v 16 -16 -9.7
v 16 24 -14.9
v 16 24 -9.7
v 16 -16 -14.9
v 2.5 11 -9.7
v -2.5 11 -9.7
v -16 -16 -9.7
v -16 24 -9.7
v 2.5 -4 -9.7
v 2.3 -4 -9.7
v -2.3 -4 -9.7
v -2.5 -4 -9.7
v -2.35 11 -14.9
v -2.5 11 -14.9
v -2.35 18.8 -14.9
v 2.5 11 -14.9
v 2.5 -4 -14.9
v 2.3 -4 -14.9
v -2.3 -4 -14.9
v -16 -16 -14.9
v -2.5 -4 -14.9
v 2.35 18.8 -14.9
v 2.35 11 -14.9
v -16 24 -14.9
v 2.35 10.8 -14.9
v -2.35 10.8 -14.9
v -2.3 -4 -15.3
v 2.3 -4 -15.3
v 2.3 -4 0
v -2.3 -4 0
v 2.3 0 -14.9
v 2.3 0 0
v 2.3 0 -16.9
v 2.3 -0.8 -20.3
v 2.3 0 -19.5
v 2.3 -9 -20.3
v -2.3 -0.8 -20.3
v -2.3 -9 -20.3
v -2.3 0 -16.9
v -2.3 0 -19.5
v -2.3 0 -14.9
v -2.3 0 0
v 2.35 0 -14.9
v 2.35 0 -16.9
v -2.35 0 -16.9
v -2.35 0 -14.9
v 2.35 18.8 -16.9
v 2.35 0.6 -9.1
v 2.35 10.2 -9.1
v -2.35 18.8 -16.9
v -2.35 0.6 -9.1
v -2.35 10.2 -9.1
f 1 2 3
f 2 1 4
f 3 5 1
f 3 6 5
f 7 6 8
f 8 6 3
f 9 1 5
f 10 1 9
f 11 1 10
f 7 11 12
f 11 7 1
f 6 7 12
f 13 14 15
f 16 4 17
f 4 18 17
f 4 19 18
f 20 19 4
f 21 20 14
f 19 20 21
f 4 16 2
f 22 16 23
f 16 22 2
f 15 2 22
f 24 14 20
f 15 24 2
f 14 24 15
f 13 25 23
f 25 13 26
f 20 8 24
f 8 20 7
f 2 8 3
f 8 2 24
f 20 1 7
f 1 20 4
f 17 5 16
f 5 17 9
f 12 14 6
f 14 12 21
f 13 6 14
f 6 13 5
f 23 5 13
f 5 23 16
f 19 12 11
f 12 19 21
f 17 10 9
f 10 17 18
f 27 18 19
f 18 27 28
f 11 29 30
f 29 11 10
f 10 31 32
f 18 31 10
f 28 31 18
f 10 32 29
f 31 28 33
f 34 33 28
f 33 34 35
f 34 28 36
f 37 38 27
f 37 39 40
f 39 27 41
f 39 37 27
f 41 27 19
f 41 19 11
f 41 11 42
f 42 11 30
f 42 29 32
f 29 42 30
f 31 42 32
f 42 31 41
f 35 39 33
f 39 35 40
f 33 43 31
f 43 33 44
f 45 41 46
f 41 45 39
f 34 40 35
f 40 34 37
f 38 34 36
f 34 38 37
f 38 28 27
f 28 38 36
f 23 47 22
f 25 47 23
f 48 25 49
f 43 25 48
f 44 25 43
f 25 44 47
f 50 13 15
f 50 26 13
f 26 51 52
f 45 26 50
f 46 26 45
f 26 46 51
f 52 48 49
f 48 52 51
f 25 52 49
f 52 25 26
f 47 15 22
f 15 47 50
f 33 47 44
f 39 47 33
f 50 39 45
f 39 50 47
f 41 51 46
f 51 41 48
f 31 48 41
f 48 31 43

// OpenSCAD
// One slot of the board, seen from the bracket side, with and without the lock.
include <../src/skadis_101_mount.scad>

part = "none";       // the last assignment wins, so the file renders nothing
show_wedge = true;   // overridden with -D on the command line

w  = slot_w - wedge_clear;
h  = slot_h - neck_h - wedge_fit;
bz = -(standoff + board_t);     // board back face

module board_tile() {
    difference() {
        translate([-16, -16, bz]) cube([32, 40, board_t]);
        translate([-slot_w / 2, -neck_h, bz - 1])
            cube([slot_w, slot_h, board_t + 2]);
    }
}

color("#b9c2cb") board_tile();
color("#44515c") skadis_peg(standoff);

if (show_wedge)
    color("#c6491a")
        translate([w / 2, 0, bz])
            rotate([0, -90, 0])
                lock_wedge();
